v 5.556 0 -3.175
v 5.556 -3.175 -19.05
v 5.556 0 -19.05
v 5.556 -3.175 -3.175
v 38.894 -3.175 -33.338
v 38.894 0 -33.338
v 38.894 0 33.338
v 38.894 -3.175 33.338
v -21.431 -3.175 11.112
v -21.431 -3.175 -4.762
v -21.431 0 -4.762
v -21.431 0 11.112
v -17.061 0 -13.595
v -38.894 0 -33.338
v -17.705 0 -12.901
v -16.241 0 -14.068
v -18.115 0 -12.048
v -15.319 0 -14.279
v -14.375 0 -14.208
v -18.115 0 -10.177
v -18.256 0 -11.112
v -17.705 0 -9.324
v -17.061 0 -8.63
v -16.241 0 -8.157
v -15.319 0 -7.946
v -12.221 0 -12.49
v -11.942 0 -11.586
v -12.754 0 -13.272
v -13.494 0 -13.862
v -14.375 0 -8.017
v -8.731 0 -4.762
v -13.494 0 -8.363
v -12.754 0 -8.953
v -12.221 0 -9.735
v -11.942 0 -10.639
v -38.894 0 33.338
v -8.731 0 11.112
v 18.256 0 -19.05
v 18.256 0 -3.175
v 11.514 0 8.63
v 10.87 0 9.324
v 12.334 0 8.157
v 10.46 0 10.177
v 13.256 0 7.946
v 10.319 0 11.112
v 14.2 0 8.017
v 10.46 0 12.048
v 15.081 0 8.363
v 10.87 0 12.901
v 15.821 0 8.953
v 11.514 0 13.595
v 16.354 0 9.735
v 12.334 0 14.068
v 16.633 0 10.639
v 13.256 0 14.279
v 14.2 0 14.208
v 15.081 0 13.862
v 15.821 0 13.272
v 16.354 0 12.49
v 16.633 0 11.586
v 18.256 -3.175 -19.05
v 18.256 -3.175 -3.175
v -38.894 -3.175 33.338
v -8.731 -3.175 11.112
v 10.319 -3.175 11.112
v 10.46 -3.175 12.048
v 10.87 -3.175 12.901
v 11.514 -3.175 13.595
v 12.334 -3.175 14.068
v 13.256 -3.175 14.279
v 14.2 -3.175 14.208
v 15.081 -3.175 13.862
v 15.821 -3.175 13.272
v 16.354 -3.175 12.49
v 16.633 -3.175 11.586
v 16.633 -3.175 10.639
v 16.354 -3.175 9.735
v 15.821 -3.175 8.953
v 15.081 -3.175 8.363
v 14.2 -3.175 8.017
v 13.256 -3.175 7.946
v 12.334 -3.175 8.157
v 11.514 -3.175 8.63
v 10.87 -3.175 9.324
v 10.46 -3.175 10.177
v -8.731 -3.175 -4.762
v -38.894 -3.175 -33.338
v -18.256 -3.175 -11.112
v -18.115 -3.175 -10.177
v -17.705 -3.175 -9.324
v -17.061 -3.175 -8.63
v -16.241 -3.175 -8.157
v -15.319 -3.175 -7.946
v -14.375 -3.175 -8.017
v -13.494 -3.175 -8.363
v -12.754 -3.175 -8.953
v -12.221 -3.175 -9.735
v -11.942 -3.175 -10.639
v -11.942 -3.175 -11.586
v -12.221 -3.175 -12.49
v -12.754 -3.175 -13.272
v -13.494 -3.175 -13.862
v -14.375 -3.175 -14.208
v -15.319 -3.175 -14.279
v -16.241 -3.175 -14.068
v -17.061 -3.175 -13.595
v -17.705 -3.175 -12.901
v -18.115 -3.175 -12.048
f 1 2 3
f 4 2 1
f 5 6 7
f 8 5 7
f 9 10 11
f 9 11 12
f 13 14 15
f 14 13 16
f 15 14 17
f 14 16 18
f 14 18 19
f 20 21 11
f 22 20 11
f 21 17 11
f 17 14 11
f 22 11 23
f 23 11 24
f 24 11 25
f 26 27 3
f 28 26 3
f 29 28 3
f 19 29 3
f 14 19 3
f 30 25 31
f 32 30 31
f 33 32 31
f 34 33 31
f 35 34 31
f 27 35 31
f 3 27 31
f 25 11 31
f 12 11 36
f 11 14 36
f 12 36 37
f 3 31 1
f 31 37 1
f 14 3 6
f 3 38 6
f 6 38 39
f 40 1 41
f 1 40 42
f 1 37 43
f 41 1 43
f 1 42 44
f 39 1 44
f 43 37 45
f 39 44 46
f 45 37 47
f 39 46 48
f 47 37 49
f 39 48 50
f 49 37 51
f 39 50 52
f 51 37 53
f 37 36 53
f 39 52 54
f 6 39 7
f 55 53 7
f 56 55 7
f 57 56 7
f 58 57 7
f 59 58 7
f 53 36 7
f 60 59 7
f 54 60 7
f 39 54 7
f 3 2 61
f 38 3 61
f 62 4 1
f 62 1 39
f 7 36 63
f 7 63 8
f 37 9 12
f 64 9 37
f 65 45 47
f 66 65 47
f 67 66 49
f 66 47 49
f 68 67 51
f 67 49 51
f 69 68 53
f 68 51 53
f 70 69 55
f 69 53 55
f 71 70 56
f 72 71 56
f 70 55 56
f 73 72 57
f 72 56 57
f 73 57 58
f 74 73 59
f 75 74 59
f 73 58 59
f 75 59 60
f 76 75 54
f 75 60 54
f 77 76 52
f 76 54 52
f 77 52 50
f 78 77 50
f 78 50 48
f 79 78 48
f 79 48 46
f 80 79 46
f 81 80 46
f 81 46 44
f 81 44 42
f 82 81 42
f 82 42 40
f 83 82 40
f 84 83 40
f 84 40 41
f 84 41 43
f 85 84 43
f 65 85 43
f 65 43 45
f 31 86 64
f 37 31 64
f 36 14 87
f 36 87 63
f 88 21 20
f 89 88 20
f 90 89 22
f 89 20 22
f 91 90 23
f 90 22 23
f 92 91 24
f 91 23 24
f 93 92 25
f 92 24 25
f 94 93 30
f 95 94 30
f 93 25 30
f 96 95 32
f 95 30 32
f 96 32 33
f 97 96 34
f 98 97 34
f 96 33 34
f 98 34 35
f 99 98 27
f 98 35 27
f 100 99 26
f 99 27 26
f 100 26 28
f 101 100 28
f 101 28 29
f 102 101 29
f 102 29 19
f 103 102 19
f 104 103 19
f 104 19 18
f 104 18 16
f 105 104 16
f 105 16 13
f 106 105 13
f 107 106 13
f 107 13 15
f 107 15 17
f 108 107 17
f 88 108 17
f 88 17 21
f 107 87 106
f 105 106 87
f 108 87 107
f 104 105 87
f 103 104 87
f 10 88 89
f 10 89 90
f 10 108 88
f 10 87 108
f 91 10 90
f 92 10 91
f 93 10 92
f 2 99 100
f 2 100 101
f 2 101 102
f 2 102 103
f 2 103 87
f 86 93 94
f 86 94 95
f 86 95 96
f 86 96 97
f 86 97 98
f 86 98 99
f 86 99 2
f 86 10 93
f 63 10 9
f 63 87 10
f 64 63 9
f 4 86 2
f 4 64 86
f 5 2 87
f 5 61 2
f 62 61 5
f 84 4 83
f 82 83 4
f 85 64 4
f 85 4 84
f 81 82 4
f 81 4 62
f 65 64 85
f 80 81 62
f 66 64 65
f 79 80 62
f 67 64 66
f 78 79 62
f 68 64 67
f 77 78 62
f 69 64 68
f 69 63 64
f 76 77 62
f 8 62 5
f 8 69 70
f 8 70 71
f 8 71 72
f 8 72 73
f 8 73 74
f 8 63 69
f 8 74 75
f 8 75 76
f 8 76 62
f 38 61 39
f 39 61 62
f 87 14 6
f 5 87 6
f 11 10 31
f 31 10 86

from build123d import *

# Parameters (mm, degrees)
F0_W     = 77.7875
F0_H     = 66.675
F1_DEPTH = 3.175
F3_D     = 6.35
F5_D     = 6.35
F6_W     = 12.7
F6_H     = 15.875
F7_DEPTH = 3.176


with BuildPart() as f1:
    # F0 (on Front) → F1 (new body)
    with BuildSketch(Plane.XZ):
        Rectangle(F0_W, F0_H)
    extrude(amount=F1_DEPTH)

    # F3 (through all)
    with Locations(Plane.XZ.offset(3.175)):
        with Locations((-15.08125, -11.1125)):
            Hole(F3_D / 2)

    # F5 (through all)
    with Locations(Plane.XZ.offset(3.175)):
        with Locations((13.49375, 11.1125)):
            Hole(F5_D / 2)

    # F6 (on face) → F7 (cut, through all)
    with BuildSketch(Plane.XZ.offset(3.175)):
        with Locations((-15.08125, 3.175)):
            Rectangle(F6_W, F6_H)
        with Locations((11.90625, -11.1125)):
            Rectangle(F6_W, F6_H)
    extrude(amount=-F7_DEPTH, mode=Mode.SUBTRACT)


solid = f1.part
